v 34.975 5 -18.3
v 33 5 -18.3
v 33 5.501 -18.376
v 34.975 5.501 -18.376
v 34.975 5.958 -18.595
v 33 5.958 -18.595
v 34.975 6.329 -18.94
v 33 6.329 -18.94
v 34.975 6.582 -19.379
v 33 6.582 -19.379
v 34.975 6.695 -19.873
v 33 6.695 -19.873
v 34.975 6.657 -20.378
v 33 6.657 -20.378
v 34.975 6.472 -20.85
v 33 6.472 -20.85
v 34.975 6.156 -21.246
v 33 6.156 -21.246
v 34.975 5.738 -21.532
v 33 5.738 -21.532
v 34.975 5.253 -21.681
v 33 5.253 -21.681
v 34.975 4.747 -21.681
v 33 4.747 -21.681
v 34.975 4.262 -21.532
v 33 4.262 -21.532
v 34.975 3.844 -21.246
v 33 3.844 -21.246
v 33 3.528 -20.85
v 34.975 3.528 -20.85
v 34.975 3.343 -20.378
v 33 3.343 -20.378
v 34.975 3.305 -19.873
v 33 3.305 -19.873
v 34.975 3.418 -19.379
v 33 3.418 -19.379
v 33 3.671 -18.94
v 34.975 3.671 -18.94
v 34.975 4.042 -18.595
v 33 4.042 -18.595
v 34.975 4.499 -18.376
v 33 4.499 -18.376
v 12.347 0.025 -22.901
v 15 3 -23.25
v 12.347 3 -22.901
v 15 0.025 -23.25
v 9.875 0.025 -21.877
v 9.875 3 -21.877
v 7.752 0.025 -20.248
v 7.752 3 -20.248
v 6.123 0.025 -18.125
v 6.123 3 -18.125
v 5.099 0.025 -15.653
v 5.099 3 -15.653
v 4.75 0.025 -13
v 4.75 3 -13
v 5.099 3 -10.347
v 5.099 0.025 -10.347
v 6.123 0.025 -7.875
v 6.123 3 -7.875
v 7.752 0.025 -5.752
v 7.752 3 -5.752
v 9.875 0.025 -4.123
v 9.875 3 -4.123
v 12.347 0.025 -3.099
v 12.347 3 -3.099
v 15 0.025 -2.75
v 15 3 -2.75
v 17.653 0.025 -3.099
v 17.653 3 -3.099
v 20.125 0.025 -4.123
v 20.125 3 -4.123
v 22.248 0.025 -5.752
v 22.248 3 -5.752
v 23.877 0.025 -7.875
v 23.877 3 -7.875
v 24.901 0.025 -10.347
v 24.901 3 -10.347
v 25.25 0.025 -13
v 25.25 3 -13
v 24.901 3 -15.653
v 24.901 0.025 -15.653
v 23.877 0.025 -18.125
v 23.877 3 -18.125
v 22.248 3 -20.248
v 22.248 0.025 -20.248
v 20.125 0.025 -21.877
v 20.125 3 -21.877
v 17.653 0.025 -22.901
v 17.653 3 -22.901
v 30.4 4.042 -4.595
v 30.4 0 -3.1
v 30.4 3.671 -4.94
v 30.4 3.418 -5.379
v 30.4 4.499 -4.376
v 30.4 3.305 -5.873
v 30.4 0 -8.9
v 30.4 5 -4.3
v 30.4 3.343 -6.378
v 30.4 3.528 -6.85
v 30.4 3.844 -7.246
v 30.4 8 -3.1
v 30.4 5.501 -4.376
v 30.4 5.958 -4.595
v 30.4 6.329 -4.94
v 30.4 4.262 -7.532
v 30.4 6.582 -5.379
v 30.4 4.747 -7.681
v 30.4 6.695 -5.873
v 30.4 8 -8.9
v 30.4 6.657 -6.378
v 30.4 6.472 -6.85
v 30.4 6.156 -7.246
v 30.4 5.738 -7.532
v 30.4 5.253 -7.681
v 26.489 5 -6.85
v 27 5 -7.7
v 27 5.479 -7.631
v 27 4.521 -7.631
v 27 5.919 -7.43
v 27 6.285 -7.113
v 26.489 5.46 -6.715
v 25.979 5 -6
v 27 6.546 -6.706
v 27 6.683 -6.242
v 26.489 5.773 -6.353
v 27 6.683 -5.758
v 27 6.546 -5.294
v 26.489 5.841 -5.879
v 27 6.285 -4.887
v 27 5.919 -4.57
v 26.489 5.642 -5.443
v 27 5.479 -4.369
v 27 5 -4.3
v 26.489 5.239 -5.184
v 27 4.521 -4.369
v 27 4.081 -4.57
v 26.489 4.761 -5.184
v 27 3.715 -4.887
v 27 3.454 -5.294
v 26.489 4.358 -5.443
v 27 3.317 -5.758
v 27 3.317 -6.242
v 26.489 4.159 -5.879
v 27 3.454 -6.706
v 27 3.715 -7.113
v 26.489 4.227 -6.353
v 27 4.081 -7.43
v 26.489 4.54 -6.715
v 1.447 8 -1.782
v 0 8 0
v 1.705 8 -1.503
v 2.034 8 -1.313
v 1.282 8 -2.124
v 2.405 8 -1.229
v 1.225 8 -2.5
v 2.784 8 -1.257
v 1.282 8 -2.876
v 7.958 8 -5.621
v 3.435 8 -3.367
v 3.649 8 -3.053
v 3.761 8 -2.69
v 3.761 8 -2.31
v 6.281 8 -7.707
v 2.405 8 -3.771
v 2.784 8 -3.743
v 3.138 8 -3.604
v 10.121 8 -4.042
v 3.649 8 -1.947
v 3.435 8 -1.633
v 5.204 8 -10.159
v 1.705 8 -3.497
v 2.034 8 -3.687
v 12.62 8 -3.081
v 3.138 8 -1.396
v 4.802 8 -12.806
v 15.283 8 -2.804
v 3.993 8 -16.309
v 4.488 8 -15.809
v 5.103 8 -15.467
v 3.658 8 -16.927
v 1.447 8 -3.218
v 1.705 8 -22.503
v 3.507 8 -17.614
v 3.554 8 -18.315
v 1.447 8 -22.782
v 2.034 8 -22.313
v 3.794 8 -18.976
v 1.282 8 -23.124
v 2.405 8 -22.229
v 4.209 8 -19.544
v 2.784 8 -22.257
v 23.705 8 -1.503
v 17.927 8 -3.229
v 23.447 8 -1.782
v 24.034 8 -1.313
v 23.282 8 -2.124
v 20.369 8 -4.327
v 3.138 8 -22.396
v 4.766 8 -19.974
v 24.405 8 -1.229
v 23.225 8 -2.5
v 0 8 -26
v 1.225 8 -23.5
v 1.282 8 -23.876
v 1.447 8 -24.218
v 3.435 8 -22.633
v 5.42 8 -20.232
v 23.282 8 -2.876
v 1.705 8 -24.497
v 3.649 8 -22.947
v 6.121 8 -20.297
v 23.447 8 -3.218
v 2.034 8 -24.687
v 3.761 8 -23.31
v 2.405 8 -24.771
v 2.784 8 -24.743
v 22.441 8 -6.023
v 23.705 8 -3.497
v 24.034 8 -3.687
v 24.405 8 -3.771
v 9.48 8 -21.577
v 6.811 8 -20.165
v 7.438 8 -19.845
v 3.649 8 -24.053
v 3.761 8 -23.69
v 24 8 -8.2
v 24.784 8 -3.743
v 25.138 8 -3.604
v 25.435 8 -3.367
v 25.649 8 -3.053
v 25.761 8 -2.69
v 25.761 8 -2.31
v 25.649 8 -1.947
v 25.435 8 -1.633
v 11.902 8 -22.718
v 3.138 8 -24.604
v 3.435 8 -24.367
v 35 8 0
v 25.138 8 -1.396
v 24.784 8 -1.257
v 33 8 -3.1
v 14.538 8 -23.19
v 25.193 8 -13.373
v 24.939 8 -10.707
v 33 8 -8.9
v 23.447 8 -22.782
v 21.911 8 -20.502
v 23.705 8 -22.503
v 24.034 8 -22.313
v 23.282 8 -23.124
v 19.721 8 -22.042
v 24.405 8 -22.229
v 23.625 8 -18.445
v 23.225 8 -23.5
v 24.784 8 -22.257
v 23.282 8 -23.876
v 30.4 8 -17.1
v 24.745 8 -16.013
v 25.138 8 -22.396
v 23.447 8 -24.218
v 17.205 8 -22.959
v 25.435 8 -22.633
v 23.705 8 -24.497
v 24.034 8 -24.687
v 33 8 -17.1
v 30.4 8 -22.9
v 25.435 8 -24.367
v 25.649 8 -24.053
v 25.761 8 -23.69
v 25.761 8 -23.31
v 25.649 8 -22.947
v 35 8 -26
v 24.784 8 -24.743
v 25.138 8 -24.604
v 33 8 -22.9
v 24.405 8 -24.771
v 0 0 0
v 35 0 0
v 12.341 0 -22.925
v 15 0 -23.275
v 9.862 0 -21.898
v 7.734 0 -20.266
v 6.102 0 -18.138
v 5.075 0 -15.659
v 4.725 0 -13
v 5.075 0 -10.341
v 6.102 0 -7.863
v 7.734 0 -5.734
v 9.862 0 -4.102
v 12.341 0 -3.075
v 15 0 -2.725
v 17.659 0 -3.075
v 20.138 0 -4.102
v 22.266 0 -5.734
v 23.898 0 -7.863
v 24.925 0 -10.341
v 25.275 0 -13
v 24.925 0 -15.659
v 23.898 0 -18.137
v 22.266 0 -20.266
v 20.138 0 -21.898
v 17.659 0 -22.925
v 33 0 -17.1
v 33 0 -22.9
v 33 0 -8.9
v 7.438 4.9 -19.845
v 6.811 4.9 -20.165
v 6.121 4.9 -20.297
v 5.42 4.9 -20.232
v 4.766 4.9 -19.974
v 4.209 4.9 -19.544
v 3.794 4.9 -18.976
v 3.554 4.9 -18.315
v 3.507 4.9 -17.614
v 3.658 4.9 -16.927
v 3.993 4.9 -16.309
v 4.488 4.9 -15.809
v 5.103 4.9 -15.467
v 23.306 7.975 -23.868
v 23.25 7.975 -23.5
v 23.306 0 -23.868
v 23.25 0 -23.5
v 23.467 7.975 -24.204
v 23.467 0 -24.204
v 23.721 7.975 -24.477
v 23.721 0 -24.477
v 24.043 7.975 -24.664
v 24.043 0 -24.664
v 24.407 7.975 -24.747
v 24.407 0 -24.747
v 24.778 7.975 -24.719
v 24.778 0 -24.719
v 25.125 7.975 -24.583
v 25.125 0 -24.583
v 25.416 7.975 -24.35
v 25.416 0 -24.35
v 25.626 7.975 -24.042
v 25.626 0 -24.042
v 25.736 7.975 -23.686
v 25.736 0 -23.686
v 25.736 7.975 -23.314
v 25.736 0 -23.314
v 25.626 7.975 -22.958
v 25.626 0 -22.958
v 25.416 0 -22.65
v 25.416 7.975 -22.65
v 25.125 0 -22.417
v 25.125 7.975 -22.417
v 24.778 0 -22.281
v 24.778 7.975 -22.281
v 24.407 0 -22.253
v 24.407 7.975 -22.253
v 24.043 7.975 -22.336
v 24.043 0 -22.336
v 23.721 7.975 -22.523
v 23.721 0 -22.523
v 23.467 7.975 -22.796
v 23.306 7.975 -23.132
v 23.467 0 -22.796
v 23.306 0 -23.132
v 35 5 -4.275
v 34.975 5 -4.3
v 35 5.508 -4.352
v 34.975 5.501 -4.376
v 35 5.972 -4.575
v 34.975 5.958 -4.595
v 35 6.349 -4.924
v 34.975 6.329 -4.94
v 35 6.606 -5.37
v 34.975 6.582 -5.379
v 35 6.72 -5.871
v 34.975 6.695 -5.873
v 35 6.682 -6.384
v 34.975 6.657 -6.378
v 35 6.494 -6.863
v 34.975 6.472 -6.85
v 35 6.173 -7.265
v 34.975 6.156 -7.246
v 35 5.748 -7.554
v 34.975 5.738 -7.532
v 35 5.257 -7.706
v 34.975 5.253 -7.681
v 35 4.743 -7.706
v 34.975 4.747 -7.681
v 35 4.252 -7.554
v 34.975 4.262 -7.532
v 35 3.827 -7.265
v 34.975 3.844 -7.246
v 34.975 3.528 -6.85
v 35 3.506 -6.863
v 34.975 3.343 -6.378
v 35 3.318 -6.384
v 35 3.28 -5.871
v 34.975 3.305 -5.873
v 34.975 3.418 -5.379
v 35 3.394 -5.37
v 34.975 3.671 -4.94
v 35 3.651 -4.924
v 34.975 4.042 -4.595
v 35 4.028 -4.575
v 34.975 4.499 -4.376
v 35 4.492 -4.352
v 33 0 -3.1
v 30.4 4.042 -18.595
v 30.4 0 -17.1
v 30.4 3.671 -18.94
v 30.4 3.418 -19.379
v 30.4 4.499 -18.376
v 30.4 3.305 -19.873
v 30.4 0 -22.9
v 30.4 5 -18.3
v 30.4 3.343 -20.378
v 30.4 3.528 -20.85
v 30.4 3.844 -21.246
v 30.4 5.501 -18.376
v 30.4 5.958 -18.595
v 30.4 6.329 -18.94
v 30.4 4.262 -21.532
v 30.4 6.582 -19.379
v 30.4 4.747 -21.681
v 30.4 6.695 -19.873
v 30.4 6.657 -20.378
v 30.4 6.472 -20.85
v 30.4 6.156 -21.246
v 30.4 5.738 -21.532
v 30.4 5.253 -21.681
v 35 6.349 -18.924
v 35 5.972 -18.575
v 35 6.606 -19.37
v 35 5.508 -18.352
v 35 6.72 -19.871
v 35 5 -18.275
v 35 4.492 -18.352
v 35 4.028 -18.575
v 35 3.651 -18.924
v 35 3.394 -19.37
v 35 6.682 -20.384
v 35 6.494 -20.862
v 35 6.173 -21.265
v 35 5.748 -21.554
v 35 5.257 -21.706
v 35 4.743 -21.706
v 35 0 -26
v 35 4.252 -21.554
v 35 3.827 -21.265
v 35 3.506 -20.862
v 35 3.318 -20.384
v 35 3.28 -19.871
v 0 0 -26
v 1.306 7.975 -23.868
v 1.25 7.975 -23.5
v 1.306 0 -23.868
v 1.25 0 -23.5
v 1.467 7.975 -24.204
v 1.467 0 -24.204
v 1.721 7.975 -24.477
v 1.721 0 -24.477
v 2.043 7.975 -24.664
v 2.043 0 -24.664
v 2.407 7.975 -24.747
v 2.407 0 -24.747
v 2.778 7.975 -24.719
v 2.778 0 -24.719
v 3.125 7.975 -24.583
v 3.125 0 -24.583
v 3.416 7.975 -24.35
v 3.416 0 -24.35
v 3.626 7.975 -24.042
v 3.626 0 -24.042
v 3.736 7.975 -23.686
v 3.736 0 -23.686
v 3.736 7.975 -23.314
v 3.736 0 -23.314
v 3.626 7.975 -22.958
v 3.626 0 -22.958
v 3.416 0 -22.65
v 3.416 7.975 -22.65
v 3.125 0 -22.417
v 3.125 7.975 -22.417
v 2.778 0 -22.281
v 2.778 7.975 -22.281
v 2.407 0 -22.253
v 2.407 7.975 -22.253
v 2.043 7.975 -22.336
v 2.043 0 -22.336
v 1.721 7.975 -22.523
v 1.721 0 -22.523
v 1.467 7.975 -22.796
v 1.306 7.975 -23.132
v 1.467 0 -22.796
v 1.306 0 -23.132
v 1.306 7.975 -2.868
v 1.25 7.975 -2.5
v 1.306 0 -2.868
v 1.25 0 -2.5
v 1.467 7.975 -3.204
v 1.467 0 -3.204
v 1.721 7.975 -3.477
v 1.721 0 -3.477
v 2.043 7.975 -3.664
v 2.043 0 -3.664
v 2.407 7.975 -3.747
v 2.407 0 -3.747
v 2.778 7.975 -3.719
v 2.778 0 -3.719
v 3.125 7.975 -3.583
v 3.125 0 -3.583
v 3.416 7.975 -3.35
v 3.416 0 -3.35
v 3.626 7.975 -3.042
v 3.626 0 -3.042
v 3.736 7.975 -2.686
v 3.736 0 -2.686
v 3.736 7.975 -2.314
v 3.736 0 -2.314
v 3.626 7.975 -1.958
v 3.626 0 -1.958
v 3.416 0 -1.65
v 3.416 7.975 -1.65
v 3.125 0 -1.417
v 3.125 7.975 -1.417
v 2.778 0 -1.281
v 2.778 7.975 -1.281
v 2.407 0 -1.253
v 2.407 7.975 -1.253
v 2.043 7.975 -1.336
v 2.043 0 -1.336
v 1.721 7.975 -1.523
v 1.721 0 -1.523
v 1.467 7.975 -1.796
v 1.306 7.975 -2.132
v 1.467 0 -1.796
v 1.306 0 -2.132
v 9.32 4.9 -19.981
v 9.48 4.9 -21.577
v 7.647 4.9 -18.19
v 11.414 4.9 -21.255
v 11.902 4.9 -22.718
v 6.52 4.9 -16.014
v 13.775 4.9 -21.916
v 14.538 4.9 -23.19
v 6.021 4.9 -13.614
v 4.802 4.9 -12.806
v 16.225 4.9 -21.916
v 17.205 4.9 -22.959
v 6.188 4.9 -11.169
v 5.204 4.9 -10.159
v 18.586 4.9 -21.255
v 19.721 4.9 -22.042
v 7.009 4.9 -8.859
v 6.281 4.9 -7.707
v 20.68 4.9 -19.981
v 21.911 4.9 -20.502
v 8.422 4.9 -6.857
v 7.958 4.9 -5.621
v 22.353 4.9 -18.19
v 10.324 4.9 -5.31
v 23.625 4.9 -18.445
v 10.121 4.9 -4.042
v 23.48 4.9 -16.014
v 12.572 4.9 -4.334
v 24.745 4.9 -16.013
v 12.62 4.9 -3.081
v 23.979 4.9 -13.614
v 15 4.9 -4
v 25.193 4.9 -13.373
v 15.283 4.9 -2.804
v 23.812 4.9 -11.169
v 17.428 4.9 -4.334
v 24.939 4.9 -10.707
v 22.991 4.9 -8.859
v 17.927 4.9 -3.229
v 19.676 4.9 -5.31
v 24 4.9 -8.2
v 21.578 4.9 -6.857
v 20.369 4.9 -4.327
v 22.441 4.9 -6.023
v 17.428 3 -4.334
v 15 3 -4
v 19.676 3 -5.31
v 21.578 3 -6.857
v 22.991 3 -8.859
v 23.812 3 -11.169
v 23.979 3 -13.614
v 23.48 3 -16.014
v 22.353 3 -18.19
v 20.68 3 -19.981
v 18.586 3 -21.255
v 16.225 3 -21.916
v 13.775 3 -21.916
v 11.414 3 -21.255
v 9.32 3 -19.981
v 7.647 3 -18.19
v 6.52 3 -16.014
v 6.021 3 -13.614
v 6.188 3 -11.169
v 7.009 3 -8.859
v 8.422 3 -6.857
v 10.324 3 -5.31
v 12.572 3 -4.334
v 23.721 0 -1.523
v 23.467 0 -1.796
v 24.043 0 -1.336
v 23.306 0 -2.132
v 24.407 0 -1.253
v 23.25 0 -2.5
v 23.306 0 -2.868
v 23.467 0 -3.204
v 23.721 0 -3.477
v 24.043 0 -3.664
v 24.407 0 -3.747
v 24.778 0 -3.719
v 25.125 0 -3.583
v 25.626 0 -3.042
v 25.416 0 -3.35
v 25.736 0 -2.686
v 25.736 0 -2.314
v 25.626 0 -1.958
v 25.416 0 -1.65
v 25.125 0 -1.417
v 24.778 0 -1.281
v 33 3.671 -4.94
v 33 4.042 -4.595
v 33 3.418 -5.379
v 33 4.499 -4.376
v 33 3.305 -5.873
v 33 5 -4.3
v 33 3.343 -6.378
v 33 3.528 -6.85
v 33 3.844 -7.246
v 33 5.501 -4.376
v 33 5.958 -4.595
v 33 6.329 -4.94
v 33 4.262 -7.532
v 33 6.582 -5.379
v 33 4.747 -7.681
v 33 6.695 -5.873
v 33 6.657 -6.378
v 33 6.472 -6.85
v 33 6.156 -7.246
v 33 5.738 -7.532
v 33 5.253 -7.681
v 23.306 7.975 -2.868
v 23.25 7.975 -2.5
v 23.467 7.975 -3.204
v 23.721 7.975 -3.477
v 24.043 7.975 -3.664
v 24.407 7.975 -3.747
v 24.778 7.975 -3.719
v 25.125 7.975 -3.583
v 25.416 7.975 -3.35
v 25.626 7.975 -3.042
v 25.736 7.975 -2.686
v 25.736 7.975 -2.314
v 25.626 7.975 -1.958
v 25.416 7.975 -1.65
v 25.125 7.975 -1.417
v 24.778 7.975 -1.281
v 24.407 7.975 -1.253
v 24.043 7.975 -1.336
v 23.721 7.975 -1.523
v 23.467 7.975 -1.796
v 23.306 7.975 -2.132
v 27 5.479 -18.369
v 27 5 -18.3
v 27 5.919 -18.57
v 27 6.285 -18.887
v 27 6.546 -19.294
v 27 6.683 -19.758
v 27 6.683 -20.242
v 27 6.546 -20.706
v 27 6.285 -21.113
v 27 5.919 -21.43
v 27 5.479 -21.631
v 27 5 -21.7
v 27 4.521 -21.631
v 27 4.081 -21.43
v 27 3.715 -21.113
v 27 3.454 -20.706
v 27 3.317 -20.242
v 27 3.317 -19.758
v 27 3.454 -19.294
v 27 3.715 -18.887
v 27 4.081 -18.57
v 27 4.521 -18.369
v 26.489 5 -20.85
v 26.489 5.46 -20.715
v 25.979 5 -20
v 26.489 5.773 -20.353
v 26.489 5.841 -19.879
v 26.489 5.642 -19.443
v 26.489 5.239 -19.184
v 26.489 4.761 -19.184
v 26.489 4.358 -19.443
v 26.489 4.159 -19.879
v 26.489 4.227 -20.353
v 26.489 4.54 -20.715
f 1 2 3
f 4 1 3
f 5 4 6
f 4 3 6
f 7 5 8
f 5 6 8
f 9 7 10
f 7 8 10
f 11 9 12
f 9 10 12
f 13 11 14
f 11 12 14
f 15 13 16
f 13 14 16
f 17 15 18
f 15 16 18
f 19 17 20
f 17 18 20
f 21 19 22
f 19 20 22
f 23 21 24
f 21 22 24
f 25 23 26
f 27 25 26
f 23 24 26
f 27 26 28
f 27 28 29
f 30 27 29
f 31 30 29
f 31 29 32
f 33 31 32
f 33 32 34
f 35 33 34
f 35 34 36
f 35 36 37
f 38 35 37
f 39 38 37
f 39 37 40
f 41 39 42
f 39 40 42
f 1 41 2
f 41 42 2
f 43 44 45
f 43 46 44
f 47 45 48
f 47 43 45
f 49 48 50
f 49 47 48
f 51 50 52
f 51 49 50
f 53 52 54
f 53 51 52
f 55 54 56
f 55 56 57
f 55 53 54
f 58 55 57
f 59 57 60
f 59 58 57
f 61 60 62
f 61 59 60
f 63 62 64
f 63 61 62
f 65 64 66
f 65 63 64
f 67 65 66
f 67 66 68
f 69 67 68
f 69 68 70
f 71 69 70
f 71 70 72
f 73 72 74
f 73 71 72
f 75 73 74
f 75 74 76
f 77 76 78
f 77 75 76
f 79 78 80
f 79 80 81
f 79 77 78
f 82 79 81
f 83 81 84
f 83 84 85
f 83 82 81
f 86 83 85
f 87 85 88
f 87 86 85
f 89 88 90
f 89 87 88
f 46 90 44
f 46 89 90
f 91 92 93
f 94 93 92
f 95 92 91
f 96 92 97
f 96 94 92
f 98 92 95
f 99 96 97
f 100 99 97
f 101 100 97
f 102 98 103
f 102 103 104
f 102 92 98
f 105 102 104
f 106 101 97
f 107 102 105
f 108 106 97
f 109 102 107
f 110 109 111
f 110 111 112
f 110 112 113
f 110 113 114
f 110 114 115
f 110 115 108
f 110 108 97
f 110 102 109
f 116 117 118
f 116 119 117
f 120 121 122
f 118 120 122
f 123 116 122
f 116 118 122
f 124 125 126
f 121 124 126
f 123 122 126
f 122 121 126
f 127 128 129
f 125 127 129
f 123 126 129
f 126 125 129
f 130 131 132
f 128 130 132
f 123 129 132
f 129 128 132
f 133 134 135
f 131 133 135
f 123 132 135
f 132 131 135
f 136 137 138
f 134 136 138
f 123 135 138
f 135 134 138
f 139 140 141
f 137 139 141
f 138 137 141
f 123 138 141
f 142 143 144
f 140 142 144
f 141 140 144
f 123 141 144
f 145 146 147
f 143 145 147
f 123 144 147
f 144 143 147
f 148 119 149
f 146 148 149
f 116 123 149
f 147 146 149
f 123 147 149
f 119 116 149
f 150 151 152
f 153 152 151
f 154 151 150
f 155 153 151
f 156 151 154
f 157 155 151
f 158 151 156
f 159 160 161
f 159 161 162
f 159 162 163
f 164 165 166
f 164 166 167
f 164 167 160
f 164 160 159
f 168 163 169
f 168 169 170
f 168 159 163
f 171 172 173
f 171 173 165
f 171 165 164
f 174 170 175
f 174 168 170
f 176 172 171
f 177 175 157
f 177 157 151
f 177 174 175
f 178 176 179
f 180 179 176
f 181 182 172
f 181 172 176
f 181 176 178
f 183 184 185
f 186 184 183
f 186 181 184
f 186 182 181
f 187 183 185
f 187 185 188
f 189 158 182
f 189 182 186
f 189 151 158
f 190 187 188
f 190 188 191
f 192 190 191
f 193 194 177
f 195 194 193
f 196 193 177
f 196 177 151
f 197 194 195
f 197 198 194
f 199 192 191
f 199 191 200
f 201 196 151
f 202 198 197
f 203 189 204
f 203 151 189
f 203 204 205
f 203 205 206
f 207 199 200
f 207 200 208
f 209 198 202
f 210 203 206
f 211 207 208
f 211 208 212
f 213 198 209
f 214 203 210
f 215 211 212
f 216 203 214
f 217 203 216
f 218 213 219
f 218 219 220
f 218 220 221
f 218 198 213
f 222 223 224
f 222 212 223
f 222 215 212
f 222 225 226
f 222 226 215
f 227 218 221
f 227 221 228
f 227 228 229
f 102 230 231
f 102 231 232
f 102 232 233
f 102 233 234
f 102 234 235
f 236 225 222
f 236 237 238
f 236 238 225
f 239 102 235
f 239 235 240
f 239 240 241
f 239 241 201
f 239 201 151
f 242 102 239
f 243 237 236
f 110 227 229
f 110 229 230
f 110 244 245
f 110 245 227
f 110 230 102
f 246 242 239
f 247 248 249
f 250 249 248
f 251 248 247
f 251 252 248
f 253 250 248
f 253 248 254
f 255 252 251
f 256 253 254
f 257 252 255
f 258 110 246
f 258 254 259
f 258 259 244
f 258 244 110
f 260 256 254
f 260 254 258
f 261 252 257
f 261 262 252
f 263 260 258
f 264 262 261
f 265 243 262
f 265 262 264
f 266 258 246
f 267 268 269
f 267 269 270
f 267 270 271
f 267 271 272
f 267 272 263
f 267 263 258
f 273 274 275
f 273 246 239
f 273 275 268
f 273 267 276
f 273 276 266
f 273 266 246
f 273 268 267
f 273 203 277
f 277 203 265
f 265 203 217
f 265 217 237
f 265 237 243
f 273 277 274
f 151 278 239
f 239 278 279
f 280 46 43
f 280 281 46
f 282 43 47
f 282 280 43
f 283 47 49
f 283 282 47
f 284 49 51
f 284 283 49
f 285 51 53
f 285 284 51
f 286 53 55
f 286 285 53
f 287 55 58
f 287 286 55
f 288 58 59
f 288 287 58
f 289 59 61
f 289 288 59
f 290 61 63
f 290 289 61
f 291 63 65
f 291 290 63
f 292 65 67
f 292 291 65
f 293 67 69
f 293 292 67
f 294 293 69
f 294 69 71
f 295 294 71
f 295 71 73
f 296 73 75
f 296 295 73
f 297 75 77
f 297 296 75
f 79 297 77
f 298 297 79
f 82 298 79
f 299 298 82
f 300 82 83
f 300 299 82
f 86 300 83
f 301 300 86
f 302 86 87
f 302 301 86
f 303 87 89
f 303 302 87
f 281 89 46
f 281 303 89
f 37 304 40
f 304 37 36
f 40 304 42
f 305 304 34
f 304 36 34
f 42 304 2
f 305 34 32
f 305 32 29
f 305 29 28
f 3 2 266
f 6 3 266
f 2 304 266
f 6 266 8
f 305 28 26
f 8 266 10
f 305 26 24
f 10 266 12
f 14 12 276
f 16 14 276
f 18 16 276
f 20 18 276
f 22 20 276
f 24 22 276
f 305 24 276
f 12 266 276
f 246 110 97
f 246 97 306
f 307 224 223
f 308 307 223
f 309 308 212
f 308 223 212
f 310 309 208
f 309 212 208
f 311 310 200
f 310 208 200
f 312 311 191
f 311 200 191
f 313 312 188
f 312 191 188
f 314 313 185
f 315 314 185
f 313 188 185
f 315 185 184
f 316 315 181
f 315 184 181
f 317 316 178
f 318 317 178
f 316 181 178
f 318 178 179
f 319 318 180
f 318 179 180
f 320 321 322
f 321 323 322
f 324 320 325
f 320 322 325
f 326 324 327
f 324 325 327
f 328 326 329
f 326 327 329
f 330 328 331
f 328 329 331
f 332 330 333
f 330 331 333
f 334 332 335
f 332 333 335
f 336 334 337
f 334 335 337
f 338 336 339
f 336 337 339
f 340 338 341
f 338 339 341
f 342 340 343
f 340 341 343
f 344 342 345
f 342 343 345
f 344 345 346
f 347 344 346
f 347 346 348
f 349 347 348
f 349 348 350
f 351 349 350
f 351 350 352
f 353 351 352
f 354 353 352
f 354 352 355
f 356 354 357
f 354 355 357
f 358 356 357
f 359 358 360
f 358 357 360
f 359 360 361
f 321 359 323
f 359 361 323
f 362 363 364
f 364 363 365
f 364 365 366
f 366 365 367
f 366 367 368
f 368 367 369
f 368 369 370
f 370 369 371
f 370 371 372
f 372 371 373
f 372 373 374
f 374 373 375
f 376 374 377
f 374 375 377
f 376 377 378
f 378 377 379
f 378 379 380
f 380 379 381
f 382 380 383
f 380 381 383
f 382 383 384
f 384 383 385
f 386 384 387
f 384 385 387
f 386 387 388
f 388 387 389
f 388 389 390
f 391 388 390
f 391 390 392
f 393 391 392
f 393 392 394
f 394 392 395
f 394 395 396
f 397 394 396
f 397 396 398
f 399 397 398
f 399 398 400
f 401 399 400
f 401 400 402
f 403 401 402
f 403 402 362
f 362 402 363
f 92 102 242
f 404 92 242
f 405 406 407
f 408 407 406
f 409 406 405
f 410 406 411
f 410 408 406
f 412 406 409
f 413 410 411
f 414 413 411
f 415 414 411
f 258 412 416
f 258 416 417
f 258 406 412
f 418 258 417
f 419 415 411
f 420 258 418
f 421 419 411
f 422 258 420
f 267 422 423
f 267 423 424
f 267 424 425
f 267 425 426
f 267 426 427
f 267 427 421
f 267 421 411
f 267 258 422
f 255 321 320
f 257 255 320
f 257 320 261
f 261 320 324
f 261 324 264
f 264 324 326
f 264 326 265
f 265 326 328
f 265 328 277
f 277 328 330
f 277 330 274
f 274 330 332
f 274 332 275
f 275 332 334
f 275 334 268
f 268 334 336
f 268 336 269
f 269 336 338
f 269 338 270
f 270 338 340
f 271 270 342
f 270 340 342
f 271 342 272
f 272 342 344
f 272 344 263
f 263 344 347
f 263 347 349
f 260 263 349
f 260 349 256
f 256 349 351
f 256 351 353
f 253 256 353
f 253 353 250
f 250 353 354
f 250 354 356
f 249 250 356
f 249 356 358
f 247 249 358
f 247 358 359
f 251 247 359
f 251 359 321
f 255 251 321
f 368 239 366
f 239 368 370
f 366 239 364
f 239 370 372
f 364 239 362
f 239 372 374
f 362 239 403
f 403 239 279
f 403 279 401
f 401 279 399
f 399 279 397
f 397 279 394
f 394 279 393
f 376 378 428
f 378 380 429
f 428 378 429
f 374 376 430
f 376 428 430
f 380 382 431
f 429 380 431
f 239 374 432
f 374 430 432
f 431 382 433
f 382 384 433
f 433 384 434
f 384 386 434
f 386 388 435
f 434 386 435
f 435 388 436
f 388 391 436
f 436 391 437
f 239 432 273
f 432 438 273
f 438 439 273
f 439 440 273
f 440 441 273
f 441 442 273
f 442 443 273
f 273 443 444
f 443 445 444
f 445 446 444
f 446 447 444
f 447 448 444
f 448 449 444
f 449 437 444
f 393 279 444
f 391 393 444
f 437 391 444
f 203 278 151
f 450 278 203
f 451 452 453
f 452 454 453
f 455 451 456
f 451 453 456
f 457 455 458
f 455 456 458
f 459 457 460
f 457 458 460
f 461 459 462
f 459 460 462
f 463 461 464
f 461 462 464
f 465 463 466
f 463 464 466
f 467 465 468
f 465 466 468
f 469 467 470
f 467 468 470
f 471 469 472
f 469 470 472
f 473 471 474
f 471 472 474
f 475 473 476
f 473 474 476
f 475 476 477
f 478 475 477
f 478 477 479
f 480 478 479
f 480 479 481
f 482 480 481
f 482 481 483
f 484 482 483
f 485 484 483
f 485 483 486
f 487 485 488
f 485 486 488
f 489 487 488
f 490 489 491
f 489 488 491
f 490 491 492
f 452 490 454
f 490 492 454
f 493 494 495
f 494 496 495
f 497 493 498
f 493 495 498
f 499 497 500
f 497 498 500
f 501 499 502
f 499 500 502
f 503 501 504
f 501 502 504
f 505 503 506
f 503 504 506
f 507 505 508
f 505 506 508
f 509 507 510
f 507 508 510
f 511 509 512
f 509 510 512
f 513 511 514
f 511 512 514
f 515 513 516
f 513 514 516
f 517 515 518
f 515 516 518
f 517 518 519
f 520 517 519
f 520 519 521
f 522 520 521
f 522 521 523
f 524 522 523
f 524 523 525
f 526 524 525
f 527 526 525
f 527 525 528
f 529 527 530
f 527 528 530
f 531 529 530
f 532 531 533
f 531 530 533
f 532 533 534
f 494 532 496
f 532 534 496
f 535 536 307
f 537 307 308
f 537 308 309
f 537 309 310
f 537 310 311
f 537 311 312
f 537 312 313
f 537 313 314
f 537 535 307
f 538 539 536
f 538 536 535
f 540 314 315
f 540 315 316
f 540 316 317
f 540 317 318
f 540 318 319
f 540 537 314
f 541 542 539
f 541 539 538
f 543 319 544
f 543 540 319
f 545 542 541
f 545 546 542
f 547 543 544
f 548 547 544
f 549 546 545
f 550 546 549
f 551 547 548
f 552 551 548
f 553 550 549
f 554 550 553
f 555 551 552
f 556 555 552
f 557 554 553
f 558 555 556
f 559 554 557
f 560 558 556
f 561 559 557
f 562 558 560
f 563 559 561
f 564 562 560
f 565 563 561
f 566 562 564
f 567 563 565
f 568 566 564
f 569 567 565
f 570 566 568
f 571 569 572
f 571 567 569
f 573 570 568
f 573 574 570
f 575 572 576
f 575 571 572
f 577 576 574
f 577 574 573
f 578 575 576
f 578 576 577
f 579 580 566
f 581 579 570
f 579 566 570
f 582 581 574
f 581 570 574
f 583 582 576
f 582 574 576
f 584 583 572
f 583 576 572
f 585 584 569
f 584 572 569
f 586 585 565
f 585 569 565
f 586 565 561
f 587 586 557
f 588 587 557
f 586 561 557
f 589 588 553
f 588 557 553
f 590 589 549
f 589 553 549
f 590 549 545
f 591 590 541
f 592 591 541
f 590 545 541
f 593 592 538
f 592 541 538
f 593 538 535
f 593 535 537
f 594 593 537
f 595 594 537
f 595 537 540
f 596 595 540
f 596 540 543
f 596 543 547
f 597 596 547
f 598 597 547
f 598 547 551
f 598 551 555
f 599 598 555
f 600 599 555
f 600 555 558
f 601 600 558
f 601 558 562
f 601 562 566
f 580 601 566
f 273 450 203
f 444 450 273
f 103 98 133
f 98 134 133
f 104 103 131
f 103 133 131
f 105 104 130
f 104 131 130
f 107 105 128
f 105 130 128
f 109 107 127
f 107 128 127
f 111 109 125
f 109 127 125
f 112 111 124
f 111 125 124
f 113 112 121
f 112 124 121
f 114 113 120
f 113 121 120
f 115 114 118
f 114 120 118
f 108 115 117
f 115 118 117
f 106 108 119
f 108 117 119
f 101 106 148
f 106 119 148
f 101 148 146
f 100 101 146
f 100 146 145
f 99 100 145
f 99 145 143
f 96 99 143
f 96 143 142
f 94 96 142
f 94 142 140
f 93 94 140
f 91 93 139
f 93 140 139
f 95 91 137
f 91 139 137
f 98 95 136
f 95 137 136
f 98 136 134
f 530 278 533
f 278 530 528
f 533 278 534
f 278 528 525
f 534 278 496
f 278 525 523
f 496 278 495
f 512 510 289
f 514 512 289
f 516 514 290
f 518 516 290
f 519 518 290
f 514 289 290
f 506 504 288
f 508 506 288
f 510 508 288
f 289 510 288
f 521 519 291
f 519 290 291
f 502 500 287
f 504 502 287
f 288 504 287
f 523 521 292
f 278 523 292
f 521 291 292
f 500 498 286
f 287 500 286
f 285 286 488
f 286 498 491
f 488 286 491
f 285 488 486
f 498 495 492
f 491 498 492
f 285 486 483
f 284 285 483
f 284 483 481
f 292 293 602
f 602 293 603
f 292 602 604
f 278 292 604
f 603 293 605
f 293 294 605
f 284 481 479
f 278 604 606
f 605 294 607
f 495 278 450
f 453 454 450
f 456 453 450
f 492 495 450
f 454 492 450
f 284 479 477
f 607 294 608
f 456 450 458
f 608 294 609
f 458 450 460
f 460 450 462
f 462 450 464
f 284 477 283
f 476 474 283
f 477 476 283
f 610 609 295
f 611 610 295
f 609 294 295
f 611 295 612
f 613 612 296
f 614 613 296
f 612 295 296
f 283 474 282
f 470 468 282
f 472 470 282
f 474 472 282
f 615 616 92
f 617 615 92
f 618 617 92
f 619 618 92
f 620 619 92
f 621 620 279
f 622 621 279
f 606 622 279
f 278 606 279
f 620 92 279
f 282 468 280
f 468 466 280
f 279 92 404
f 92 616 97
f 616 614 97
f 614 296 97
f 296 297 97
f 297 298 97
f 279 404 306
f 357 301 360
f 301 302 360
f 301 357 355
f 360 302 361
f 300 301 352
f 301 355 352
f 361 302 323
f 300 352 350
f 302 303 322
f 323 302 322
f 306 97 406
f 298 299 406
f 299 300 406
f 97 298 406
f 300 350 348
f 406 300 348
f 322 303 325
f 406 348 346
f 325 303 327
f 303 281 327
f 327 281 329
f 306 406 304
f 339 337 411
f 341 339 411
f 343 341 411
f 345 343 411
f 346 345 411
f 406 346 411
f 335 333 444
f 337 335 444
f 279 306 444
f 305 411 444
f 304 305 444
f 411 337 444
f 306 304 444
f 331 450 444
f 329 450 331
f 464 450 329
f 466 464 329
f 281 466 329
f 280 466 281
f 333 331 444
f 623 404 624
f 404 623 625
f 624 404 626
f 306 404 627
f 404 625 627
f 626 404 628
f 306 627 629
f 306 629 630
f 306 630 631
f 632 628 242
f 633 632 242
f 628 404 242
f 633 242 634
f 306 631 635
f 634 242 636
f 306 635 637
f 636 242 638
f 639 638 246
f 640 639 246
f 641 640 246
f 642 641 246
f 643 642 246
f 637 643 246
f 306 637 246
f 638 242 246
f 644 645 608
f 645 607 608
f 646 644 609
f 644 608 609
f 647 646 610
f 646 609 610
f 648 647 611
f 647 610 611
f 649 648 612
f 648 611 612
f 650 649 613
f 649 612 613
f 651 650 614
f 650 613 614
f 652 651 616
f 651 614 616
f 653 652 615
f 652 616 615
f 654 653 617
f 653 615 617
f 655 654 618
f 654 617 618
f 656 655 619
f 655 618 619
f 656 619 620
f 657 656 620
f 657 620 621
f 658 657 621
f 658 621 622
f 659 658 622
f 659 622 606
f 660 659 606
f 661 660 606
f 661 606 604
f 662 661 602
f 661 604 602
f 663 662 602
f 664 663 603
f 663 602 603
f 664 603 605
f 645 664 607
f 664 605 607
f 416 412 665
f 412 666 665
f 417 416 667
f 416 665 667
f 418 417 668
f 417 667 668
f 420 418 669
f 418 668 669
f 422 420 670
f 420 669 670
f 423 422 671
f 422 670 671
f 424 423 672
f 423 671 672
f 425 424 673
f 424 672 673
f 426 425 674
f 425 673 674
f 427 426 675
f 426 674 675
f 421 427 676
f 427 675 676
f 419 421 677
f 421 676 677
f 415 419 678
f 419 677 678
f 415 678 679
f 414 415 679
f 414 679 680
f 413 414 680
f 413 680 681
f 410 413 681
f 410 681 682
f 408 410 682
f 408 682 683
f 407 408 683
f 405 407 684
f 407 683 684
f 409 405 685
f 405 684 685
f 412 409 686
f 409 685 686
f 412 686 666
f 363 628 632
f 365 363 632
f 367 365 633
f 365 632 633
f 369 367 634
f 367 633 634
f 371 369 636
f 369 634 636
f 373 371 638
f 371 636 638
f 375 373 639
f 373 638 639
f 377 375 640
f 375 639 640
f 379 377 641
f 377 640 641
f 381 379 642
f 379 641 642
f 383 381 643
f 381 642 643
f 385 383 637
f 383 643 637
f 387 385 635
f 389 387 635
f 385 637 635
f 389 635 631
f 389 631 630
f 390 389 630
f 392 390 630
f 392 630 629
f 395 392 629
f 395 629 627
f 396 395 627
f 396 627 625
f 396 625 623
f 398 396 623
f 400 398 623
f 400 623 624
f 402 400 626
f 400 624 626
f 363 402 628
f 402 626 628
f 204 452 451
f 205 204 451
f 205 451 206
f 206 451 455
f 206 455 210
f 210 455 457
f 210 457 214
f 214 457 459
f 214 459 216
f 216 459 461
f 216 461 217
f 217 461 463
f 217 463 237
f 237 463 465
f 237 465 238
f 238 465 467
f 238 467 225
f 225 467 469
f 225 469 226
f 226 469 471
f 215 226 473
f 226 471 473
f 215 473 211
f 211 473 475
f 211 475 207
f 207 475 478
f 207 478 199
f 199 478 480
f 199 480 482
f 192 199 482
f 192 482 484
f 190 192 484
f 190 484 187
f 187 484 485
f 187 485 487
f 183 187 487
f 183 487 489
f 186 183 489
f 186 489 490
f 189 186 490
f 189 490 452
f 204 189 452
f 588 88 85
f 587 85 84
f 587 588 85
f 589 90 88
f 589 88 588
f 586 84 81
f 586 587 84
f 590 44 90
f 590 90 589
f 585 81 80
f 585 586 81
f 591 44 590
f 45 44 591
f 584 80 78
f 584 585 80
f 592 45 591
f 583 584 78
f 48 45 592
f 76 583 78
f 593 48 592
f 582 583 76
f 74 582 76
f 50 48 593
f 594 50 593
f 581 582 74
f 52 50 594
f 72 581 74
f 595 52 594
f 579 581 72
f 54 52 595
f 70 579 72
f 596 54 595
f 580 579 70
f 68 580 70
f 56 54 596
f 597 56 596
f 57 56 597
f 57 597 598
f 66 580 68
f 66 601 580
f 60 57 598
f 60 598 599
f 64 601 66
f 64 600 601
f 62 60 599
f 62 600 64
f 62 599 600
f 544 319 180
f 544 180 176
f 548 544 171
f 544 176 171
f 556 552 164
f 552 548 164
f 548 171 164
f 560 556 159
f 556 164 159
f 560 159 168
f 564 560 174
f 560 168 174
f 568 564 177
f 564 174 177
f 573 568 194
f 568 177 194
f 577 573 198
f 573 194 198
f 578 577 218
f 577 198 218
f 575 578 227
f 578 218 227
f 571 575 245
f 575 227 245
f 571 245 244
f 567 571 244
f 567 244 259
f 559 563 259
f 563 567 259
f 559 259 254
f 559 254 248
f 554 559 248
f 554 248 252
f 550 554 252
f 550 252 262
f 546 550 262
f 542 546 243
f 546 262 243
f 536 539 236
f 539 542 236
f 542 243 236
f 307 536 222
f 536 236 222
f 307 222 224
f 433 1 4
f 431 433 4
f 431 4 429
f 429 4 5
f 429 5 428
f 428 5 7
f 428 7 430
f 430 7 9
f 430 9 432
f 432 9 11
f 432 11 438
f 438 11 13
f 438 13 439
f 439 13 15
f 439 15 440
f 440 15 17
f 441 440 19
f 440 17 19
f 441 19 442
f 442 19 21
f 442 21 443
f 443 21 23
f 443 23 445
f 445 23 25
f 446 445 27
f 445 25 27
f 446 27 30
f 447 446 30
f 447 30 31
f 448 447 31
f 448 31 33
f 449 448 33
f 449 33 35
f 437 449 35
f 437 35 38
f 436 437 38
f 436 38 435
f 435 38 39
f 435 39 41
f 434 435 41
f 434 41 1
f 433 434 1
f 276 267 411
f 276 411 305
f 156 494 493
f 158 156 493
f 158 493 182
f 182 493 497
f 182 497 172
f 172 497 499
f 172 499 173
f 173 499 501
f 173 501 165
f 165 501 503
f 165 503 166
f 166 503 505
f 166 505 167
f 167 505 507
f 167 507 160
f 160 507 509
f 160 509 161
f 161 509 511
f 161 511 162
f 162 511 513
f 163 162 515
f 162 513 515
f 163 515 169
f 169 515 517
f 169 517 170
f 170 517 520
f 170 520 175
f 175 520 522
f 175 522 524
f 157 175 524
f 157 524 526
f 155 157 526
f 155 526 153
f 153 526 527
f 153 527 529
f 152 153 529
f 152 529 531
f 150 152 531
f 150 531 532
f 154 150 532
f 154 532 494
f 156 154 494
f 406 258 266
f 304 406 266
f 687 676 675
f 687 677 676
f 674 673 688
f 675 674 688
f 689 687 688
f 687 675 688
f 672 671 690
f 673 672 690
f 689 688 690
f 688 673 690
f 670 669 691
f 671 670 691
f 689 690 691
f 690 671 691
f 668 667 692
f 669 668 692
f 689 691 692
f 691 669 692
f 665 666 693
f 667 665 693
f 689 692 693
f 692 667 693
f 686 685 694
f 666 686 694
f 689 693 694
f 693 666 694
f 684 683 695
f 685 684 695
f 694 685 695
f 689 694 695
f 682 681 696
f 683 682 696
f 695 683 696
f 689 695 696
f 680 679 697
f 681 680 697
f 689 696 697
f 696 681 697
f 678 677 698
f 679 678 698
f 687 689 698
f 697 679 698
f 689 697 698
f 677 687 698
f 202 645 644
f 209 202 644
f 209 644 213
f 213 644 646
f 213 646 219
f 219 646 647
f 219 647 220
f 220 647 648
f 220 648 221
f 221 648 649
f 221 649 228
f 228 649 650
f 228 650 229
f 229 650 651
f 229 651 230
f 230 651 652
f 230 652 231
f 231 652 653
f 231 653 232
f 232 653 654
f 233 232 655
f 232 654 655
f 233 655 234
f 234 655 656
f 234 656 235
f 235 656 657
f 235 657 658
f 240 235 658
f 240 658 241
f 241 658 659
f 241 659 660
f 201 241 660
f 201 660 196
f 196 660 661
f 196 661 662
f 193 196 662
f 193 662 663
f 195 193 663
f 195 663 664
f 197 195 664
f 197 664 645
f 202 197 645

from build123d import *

# Parameters (mm, degrees)
SKETCH1_W                             = 35
SKETCH1_H                             = 26
BOSS_EXTRUDE1_DEPTH                   = 8
M3_CLEARANCE_HOLE1_D                  = 3.4
M3_CLEARANCE_HOLE1_DEPTH              = 8
M3_CLEARANCE_HOLE1_CSINK_D            = 3.45
M3_CLEARANCE_HOLE1_CSINK_ANGLE        = 90
M3_CLEARANCE_HOLE1_TIP                = 1.021463052
SKETCH6_R                             = 10.2
CUT_EXTRUDE1_DEPTH                    = 3.1
SKETCH7_R                             = 9
CUT_EXTRUDE2_DEPTH                    = 44.874935897
SKETCH8_R                             = 2.5
CUT_EXTRUDE3_DEPTH                    = 3.1
TAP_DRILL_FOR_M3X0_5_TAP1_D           = 2.5
TAP_DRILL_FOR_M3X0_5_TAP1_CSINK_D     = 2.55
TAP_DRILL_FOR_M3X0_5_TAP1_CSINK_ANGLE = 90
SKETCH11_W                            = 2.6
SKETCH11_H                            = 5.8
CUT_EXTRUDE4_DEPTH                    = 45.328320519


with BuildPart() as part:
    # Sketch1 → Boss-Extrude1 (new body)
    with BuildSketch(Plane(origin=(0, 0, 0), x_dir=(1, 0, 0), z_dir=(0, 1, 0))):
        with Locations((17.5, 13)):
            Rectangle(SKETCH1_W, SKETCH1_H)
    extrude(amount=BOSS_EXTRUDE1_DEPTH)

    # M3 Clearance Hole1
    with Locations(Plane(origin=(35, 0, 0), x_dir=(0, 0, -1), z_dir=(1, 0, 0))):
        with Locations((6, 5), (20, 5)):
            CounterSinkHole(M3_CLEARANCE_HOLE1_D / 2, M3_CLEARANCE_HOLE1_CSINK_D / 2, depth=M3_CLEARANCE_HOLE1_DEPTH, counter_sink_angle=M3_CLEARANCE_HOLE1_CSINK_ANGLE)
            with Locations((0, 0, -(M3_CLEARANCE_HOLE1_DEPTH + M3_CLEARANCE_HOLE1_TIP / 2))):  # 118° drill point
                Cone(0, M3_CLEARANCE_HOLE1_D / 2, M3_CLEARANCE_HOLE1_TIP, mode=Mode.SUBTRACT)

    # Sketch5 → Tap Drill for M22x1.5 Tap1 (revolve, cut)
    with BuildSketch(Plane(origin=(15, 0, -13), x_dir=(0, 0, -1), z_dir=(1, 0, 0))):
        Polygon((0, 0), (0, 3), (10.25, 3), (10.25, 0.025), (10.275, 0), align=None)
    revolve(axis=Axis((15, -6.35, -13), (0, 1, 0)), mode=Mode.SUBTRACT)

    # Sketch6 → Cut-Extrude1 (cut)
    with BuildSketch(Plane(origin=(0, 8, 0), x_dir=(1, 0, 0), z_dir=(0, 1, 0))):
        with Locations(Location((15, 13, 0), (0, 0, 270))):
            Circle(SKETCH6_R)
    extrude(amount=-CUT_EXTRUDE1_DEPTH, mode=Mode.SUBTRACT)

    # Sketch7 → Cut-Extrude2 (cut, through all)
    with BuildSketch(Plane(origin=(0, 4.9, 0), x_dir=(1, 0, 0), z_dir=(0, 1, 0))):
        with Locations(Location((15, 13, 0), (0, 0, 270))):
            Circle(SKETCH7_R)
    extrude(amount=-CUT_EXTRUDE2_DEPTH, mode=Mode.SUBTRACT)

    # Sketch8 → Cut-Extrude3 (cut)
    with BuildSketch(Plane(origin=(0, 8, 0), x_dir=(1, 0, 0), z_dir=(0, 1, 0))):
        with Locations((6, 17.8)):
            Circle(SKETCH8_R)
    extrude(amount=-CUT_EXTRUDE3_DEPTH, mode=Mode.SUBTRACT)

    # Tap Drill for M3x0.5 Tap1 (through all)
    with Locations(Plane(origin=(0, 8, 0), x_dir=(1, 0, 0), z_dir=(0, 1, 0))):
        with Locations((2.5, 23.5), (24.5, 23.5), (24.5, 2.5), (2.5, 2.5)):
            CounterSinkHole(TAP_DRILL_FOR_M3X0_5_TAP1_D / 2, TAP_DRILL_FOR_M3X0_5_TAP1_CSINK_D / 2, counter_sink_angle=TAP_DRILL_FOR_M3X0_5_TAP1_CSINK_ANGLE)

    # Sketch11 → Cut-Extrude4 (cut, through all)
    with BuildSketch(Plane(origin=(0, 8, 0), x_dir=(1, 0, 0), z_dir=(0, 1, 0))):
        with Locations((31.7, 6)):
            Rectangle(SKETCH11_W, SKETCH11_H)
        with Locations((31.7, 20)):
            Rectangle(SKETCH11_W, SKETCH11_H)
    extrude(amount=-CUT_EXTRUDE4_DEPTH, mode=Mode.SUBTRACT)


solid = part.part
